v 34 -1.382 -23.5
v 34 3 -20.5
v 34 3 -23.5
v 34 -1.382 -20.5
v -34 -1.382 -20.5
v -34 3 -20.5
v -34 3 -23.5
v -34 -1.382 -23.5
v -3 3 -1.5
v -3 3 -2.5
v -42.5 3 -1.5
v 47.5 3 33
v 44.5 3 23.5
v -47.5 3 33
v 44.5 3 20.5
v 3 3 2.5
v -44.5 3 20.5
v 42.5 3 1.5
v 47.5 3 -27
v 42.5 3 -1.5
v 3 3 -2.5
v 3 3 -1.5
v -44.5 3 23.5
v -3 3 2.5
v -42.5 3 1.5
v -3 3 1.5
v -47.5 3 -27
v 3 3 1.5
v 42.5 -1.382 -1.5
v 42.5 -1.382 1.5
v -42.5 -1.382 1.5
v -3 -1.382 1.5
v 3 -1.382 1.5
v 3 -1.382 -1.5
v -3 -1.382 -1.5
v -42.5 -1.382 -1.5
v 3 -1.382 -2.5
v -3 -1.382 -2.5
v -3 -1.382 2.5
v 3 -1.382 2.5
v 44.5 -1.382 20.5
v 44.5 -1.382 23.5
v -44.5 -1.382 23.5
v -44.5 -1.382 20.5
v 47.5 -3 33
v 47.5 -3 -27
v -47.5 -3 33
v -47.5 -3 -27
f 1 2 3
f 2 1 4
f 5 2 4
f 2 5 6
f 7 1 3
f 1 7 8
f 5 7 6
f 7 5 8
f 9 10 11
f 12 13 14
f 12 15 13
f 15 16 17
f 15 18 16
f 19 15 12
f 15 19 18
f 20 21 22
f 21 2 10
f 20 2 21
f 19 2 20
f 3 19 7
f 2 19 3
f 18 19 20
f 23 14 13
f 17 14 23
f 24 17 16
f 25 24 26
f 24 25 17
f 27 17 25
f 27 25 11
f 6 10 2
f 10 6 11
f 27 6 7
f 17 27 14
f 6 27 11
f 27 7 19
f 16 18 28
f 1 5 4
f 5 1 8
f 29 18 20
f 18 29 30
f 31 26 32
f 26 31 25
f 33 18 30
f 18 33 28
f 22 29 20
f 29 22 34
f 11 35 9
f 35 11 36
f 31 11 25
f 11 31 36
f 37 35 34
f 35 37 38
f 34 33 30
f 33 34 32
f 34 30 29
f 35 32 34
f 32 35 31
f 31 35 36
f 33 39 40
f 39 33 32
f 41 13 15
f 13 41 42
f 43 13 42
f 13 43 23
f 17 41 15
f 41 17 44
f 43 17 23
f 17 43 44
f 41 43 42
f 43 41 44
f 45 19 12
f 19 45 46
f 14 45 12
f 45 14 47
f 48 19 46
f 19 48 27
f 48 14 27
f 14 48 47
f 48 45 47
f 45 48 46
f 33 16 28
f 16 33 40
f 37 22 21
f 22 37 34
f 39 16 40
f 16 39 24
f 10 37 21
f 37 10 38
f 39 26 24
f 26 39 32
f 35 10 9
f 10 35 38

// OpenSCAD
// file: lib/util.scad
// Small utilities to keep parts readable.

module centered_cylinder(d, h) {
  translate([0, 0, -h / 2]) cylinder(d = d, h = h, $fn = 96);
}
// file: parts/yagi_card.scad
include <../lib/util.scad>;

// 3-element yagi element card (backplane/boom only; no mount stub).
//
// Coordinate convention:
//   z=0 is the focus datum (original plastic tube tip).
//   Mount seat plane is at z=-mount_seat_to_focus.
//
// Element placement (along +z):
//   director (front):   z = -element_spacing
//   driven (dipole):    z = 0
//   reflector (rear):   z = +element_spacing
//
// Elements are solid copper wire/rod; this part provides grooves only.
// The driven element groove includes a center cutout (dipole_gap) to help keep
// the two halves separated at the feedpoint and to provide clearance for a pigtail exit.

module yagi_card() {
  card_bottom_z = -mount_seat_to_focus + card_bottom_from_seat;

  director_z = -element_spacing;
  driven_z = 0;
  reflector_z = element_spacing;

  groove_center_y = card_thickness / 2 - groove_depth / 2;

  director_groove_len = director_len + 2 * element_end_margin;
  driven_groove_len = driven_len + 2 * element_end_margin;
  reflector_groove_len = reflector_len + 2 * element_end_margin;

  assert(groove_depth > 0, "groove_depth must be > 0");
  assert(groove_depth < card_thickness, "groove_depth must be < card_thickness to preserve a back wall");
  assert(card_size_x > 0, "card_size_x must be > 0");
  assert(card_size > 0, "card_size must be > 0");
  assert(director_groove_len > 0, "Computed director_groove_len must be > 0");
  assert(driven_groove_len > 0, "Computed driven_groove_len must be > 0");
  assert(reflector_groove_len > 0, "Computed reflector_groove_len must be > 0");
  assert(director_groove_len <= card_size_x, "Director groove length must be <= card_size_x");
  assert(driven_groove_len <= card_size_x, "Driven groove length must be <= card_size_x");
  assert(reflector_groove_len <= card_size_x, "Reflector groove length must be <= card_size_x");
  assert(director_z - groove_w / 2 >= card_bottom_z, "Card is too short (Z) to contain the director groove");
  assert(reflector_z + groove_w / 2 <= card_bottom_z + card_size, "Card is too short (Z) to contain the reflector groove");

  difference() {
    // Backplane/boom.
    translate([-card_size_x / 2, -card_thickness / 2, card_bottom_z])
      cube([card_size_x, card_thickness, card_size], center = false);

    // Grooves for elements (cut from the top face).
    for (g = [
      [director_z, director_groove_len],
      [driven_z, driven_groove_len],
      [reflector_z, reflector_groove_len]
    ]) {
      translate([0, groove_center_y, g[0]])
        cube([g[1], groove_depth, groove_w], center = true);
    }

    // Driven element center cutout: makes space for coax exit and dipole separation.
    translate([0, groove_center_y, driven_z])
      cube([dipole_gap, groove_depth, groove_w + 2], center = true);
  }
}
// file: lib/defaults.scad
// Project defaults (all dimensions in mm)

// Part selector (set via -D part_id=0/1/2...)
// NOTE: OpenSCAD CLI `-D` string quoting on Windows is fragile; use numeric ids.
part_id = 0; // 0=yagi_card

// Mechanical datum convention (shared across designs):
//   z=0 is the original plastic tube tip (focus reference).
//   The mount seat plane (metal post top) is at z=-mount_seat_to_focus.
mount_seat_to_focus = 33;

// Backplane/boom ("card") geometry
// NOTE: This design omits the 33mm mount stub entirely. `card_bottom_from_seat`
// is retained so the card-only print can share the same z placement as `yagi_mount`
// when mounted via a separate plug/stub.
card_bottom_from_seat = 6; // matches yagi_mount's mount_stub_len

card_size = 60;        // length along Z (dish axis)
card_size_x = 95;      // width along X (element direction)
card_thickness = 6;    // thickness along Y

// Yagi geometry (center-to-center spacing along dish axis)
element_spacing = 22;  // director <-> driven <-> reflector spacing

// Element material and retention
// NOTE: The element wire lengths are RF-critical. Do not change them without re-deriving.
//
// The groove dimensions are chosen so the element wire is fully recessed and its centerline
// aligns to the card midplane (y=0). With the card centered about y=0 and grooves cut from
// the top face (y=+card_thickness/2), this means the groove bottom should land at
// y=-wire_d/2. For 6mm^2 solid copper wire (~2.764mm dia) and card_thickness=6mm:
//   groove_depth = card_thickness/2 + wire_d/2 ~= 4.382mm
groove_w = 3;          // groove width along Z (3mm target for ~6mm^2 wire)
groove_depth = 4.382;  // groove depth from the top face (must be < card_thickness)
element_end_margin = 1; // extra groove margin on each element end (wire length remains RF-critical)
dipole_gap = 6;        // cutout at the driven element center for feedpoint separation

// Element lengths (for documentation; copper elements are not printed)
director_len = 66;
driven_len = 83;
reflector_len = 87;
// main file
// Entry point for scripted exports.
// Usage:
//   openscad -o out.stl cad/designs/yagi_card/src/main.scad -D part_id=0 ...

include <lib/defaults.scad>;
include <parts/yagi_card.scad>;

_part_id = is_undef(part_id) ? 0 : part_id;

if (_part_id == 0) {
  yagi_card();
} else {
  assert(false, str("Unknown part_id: ", _part_id));
}
